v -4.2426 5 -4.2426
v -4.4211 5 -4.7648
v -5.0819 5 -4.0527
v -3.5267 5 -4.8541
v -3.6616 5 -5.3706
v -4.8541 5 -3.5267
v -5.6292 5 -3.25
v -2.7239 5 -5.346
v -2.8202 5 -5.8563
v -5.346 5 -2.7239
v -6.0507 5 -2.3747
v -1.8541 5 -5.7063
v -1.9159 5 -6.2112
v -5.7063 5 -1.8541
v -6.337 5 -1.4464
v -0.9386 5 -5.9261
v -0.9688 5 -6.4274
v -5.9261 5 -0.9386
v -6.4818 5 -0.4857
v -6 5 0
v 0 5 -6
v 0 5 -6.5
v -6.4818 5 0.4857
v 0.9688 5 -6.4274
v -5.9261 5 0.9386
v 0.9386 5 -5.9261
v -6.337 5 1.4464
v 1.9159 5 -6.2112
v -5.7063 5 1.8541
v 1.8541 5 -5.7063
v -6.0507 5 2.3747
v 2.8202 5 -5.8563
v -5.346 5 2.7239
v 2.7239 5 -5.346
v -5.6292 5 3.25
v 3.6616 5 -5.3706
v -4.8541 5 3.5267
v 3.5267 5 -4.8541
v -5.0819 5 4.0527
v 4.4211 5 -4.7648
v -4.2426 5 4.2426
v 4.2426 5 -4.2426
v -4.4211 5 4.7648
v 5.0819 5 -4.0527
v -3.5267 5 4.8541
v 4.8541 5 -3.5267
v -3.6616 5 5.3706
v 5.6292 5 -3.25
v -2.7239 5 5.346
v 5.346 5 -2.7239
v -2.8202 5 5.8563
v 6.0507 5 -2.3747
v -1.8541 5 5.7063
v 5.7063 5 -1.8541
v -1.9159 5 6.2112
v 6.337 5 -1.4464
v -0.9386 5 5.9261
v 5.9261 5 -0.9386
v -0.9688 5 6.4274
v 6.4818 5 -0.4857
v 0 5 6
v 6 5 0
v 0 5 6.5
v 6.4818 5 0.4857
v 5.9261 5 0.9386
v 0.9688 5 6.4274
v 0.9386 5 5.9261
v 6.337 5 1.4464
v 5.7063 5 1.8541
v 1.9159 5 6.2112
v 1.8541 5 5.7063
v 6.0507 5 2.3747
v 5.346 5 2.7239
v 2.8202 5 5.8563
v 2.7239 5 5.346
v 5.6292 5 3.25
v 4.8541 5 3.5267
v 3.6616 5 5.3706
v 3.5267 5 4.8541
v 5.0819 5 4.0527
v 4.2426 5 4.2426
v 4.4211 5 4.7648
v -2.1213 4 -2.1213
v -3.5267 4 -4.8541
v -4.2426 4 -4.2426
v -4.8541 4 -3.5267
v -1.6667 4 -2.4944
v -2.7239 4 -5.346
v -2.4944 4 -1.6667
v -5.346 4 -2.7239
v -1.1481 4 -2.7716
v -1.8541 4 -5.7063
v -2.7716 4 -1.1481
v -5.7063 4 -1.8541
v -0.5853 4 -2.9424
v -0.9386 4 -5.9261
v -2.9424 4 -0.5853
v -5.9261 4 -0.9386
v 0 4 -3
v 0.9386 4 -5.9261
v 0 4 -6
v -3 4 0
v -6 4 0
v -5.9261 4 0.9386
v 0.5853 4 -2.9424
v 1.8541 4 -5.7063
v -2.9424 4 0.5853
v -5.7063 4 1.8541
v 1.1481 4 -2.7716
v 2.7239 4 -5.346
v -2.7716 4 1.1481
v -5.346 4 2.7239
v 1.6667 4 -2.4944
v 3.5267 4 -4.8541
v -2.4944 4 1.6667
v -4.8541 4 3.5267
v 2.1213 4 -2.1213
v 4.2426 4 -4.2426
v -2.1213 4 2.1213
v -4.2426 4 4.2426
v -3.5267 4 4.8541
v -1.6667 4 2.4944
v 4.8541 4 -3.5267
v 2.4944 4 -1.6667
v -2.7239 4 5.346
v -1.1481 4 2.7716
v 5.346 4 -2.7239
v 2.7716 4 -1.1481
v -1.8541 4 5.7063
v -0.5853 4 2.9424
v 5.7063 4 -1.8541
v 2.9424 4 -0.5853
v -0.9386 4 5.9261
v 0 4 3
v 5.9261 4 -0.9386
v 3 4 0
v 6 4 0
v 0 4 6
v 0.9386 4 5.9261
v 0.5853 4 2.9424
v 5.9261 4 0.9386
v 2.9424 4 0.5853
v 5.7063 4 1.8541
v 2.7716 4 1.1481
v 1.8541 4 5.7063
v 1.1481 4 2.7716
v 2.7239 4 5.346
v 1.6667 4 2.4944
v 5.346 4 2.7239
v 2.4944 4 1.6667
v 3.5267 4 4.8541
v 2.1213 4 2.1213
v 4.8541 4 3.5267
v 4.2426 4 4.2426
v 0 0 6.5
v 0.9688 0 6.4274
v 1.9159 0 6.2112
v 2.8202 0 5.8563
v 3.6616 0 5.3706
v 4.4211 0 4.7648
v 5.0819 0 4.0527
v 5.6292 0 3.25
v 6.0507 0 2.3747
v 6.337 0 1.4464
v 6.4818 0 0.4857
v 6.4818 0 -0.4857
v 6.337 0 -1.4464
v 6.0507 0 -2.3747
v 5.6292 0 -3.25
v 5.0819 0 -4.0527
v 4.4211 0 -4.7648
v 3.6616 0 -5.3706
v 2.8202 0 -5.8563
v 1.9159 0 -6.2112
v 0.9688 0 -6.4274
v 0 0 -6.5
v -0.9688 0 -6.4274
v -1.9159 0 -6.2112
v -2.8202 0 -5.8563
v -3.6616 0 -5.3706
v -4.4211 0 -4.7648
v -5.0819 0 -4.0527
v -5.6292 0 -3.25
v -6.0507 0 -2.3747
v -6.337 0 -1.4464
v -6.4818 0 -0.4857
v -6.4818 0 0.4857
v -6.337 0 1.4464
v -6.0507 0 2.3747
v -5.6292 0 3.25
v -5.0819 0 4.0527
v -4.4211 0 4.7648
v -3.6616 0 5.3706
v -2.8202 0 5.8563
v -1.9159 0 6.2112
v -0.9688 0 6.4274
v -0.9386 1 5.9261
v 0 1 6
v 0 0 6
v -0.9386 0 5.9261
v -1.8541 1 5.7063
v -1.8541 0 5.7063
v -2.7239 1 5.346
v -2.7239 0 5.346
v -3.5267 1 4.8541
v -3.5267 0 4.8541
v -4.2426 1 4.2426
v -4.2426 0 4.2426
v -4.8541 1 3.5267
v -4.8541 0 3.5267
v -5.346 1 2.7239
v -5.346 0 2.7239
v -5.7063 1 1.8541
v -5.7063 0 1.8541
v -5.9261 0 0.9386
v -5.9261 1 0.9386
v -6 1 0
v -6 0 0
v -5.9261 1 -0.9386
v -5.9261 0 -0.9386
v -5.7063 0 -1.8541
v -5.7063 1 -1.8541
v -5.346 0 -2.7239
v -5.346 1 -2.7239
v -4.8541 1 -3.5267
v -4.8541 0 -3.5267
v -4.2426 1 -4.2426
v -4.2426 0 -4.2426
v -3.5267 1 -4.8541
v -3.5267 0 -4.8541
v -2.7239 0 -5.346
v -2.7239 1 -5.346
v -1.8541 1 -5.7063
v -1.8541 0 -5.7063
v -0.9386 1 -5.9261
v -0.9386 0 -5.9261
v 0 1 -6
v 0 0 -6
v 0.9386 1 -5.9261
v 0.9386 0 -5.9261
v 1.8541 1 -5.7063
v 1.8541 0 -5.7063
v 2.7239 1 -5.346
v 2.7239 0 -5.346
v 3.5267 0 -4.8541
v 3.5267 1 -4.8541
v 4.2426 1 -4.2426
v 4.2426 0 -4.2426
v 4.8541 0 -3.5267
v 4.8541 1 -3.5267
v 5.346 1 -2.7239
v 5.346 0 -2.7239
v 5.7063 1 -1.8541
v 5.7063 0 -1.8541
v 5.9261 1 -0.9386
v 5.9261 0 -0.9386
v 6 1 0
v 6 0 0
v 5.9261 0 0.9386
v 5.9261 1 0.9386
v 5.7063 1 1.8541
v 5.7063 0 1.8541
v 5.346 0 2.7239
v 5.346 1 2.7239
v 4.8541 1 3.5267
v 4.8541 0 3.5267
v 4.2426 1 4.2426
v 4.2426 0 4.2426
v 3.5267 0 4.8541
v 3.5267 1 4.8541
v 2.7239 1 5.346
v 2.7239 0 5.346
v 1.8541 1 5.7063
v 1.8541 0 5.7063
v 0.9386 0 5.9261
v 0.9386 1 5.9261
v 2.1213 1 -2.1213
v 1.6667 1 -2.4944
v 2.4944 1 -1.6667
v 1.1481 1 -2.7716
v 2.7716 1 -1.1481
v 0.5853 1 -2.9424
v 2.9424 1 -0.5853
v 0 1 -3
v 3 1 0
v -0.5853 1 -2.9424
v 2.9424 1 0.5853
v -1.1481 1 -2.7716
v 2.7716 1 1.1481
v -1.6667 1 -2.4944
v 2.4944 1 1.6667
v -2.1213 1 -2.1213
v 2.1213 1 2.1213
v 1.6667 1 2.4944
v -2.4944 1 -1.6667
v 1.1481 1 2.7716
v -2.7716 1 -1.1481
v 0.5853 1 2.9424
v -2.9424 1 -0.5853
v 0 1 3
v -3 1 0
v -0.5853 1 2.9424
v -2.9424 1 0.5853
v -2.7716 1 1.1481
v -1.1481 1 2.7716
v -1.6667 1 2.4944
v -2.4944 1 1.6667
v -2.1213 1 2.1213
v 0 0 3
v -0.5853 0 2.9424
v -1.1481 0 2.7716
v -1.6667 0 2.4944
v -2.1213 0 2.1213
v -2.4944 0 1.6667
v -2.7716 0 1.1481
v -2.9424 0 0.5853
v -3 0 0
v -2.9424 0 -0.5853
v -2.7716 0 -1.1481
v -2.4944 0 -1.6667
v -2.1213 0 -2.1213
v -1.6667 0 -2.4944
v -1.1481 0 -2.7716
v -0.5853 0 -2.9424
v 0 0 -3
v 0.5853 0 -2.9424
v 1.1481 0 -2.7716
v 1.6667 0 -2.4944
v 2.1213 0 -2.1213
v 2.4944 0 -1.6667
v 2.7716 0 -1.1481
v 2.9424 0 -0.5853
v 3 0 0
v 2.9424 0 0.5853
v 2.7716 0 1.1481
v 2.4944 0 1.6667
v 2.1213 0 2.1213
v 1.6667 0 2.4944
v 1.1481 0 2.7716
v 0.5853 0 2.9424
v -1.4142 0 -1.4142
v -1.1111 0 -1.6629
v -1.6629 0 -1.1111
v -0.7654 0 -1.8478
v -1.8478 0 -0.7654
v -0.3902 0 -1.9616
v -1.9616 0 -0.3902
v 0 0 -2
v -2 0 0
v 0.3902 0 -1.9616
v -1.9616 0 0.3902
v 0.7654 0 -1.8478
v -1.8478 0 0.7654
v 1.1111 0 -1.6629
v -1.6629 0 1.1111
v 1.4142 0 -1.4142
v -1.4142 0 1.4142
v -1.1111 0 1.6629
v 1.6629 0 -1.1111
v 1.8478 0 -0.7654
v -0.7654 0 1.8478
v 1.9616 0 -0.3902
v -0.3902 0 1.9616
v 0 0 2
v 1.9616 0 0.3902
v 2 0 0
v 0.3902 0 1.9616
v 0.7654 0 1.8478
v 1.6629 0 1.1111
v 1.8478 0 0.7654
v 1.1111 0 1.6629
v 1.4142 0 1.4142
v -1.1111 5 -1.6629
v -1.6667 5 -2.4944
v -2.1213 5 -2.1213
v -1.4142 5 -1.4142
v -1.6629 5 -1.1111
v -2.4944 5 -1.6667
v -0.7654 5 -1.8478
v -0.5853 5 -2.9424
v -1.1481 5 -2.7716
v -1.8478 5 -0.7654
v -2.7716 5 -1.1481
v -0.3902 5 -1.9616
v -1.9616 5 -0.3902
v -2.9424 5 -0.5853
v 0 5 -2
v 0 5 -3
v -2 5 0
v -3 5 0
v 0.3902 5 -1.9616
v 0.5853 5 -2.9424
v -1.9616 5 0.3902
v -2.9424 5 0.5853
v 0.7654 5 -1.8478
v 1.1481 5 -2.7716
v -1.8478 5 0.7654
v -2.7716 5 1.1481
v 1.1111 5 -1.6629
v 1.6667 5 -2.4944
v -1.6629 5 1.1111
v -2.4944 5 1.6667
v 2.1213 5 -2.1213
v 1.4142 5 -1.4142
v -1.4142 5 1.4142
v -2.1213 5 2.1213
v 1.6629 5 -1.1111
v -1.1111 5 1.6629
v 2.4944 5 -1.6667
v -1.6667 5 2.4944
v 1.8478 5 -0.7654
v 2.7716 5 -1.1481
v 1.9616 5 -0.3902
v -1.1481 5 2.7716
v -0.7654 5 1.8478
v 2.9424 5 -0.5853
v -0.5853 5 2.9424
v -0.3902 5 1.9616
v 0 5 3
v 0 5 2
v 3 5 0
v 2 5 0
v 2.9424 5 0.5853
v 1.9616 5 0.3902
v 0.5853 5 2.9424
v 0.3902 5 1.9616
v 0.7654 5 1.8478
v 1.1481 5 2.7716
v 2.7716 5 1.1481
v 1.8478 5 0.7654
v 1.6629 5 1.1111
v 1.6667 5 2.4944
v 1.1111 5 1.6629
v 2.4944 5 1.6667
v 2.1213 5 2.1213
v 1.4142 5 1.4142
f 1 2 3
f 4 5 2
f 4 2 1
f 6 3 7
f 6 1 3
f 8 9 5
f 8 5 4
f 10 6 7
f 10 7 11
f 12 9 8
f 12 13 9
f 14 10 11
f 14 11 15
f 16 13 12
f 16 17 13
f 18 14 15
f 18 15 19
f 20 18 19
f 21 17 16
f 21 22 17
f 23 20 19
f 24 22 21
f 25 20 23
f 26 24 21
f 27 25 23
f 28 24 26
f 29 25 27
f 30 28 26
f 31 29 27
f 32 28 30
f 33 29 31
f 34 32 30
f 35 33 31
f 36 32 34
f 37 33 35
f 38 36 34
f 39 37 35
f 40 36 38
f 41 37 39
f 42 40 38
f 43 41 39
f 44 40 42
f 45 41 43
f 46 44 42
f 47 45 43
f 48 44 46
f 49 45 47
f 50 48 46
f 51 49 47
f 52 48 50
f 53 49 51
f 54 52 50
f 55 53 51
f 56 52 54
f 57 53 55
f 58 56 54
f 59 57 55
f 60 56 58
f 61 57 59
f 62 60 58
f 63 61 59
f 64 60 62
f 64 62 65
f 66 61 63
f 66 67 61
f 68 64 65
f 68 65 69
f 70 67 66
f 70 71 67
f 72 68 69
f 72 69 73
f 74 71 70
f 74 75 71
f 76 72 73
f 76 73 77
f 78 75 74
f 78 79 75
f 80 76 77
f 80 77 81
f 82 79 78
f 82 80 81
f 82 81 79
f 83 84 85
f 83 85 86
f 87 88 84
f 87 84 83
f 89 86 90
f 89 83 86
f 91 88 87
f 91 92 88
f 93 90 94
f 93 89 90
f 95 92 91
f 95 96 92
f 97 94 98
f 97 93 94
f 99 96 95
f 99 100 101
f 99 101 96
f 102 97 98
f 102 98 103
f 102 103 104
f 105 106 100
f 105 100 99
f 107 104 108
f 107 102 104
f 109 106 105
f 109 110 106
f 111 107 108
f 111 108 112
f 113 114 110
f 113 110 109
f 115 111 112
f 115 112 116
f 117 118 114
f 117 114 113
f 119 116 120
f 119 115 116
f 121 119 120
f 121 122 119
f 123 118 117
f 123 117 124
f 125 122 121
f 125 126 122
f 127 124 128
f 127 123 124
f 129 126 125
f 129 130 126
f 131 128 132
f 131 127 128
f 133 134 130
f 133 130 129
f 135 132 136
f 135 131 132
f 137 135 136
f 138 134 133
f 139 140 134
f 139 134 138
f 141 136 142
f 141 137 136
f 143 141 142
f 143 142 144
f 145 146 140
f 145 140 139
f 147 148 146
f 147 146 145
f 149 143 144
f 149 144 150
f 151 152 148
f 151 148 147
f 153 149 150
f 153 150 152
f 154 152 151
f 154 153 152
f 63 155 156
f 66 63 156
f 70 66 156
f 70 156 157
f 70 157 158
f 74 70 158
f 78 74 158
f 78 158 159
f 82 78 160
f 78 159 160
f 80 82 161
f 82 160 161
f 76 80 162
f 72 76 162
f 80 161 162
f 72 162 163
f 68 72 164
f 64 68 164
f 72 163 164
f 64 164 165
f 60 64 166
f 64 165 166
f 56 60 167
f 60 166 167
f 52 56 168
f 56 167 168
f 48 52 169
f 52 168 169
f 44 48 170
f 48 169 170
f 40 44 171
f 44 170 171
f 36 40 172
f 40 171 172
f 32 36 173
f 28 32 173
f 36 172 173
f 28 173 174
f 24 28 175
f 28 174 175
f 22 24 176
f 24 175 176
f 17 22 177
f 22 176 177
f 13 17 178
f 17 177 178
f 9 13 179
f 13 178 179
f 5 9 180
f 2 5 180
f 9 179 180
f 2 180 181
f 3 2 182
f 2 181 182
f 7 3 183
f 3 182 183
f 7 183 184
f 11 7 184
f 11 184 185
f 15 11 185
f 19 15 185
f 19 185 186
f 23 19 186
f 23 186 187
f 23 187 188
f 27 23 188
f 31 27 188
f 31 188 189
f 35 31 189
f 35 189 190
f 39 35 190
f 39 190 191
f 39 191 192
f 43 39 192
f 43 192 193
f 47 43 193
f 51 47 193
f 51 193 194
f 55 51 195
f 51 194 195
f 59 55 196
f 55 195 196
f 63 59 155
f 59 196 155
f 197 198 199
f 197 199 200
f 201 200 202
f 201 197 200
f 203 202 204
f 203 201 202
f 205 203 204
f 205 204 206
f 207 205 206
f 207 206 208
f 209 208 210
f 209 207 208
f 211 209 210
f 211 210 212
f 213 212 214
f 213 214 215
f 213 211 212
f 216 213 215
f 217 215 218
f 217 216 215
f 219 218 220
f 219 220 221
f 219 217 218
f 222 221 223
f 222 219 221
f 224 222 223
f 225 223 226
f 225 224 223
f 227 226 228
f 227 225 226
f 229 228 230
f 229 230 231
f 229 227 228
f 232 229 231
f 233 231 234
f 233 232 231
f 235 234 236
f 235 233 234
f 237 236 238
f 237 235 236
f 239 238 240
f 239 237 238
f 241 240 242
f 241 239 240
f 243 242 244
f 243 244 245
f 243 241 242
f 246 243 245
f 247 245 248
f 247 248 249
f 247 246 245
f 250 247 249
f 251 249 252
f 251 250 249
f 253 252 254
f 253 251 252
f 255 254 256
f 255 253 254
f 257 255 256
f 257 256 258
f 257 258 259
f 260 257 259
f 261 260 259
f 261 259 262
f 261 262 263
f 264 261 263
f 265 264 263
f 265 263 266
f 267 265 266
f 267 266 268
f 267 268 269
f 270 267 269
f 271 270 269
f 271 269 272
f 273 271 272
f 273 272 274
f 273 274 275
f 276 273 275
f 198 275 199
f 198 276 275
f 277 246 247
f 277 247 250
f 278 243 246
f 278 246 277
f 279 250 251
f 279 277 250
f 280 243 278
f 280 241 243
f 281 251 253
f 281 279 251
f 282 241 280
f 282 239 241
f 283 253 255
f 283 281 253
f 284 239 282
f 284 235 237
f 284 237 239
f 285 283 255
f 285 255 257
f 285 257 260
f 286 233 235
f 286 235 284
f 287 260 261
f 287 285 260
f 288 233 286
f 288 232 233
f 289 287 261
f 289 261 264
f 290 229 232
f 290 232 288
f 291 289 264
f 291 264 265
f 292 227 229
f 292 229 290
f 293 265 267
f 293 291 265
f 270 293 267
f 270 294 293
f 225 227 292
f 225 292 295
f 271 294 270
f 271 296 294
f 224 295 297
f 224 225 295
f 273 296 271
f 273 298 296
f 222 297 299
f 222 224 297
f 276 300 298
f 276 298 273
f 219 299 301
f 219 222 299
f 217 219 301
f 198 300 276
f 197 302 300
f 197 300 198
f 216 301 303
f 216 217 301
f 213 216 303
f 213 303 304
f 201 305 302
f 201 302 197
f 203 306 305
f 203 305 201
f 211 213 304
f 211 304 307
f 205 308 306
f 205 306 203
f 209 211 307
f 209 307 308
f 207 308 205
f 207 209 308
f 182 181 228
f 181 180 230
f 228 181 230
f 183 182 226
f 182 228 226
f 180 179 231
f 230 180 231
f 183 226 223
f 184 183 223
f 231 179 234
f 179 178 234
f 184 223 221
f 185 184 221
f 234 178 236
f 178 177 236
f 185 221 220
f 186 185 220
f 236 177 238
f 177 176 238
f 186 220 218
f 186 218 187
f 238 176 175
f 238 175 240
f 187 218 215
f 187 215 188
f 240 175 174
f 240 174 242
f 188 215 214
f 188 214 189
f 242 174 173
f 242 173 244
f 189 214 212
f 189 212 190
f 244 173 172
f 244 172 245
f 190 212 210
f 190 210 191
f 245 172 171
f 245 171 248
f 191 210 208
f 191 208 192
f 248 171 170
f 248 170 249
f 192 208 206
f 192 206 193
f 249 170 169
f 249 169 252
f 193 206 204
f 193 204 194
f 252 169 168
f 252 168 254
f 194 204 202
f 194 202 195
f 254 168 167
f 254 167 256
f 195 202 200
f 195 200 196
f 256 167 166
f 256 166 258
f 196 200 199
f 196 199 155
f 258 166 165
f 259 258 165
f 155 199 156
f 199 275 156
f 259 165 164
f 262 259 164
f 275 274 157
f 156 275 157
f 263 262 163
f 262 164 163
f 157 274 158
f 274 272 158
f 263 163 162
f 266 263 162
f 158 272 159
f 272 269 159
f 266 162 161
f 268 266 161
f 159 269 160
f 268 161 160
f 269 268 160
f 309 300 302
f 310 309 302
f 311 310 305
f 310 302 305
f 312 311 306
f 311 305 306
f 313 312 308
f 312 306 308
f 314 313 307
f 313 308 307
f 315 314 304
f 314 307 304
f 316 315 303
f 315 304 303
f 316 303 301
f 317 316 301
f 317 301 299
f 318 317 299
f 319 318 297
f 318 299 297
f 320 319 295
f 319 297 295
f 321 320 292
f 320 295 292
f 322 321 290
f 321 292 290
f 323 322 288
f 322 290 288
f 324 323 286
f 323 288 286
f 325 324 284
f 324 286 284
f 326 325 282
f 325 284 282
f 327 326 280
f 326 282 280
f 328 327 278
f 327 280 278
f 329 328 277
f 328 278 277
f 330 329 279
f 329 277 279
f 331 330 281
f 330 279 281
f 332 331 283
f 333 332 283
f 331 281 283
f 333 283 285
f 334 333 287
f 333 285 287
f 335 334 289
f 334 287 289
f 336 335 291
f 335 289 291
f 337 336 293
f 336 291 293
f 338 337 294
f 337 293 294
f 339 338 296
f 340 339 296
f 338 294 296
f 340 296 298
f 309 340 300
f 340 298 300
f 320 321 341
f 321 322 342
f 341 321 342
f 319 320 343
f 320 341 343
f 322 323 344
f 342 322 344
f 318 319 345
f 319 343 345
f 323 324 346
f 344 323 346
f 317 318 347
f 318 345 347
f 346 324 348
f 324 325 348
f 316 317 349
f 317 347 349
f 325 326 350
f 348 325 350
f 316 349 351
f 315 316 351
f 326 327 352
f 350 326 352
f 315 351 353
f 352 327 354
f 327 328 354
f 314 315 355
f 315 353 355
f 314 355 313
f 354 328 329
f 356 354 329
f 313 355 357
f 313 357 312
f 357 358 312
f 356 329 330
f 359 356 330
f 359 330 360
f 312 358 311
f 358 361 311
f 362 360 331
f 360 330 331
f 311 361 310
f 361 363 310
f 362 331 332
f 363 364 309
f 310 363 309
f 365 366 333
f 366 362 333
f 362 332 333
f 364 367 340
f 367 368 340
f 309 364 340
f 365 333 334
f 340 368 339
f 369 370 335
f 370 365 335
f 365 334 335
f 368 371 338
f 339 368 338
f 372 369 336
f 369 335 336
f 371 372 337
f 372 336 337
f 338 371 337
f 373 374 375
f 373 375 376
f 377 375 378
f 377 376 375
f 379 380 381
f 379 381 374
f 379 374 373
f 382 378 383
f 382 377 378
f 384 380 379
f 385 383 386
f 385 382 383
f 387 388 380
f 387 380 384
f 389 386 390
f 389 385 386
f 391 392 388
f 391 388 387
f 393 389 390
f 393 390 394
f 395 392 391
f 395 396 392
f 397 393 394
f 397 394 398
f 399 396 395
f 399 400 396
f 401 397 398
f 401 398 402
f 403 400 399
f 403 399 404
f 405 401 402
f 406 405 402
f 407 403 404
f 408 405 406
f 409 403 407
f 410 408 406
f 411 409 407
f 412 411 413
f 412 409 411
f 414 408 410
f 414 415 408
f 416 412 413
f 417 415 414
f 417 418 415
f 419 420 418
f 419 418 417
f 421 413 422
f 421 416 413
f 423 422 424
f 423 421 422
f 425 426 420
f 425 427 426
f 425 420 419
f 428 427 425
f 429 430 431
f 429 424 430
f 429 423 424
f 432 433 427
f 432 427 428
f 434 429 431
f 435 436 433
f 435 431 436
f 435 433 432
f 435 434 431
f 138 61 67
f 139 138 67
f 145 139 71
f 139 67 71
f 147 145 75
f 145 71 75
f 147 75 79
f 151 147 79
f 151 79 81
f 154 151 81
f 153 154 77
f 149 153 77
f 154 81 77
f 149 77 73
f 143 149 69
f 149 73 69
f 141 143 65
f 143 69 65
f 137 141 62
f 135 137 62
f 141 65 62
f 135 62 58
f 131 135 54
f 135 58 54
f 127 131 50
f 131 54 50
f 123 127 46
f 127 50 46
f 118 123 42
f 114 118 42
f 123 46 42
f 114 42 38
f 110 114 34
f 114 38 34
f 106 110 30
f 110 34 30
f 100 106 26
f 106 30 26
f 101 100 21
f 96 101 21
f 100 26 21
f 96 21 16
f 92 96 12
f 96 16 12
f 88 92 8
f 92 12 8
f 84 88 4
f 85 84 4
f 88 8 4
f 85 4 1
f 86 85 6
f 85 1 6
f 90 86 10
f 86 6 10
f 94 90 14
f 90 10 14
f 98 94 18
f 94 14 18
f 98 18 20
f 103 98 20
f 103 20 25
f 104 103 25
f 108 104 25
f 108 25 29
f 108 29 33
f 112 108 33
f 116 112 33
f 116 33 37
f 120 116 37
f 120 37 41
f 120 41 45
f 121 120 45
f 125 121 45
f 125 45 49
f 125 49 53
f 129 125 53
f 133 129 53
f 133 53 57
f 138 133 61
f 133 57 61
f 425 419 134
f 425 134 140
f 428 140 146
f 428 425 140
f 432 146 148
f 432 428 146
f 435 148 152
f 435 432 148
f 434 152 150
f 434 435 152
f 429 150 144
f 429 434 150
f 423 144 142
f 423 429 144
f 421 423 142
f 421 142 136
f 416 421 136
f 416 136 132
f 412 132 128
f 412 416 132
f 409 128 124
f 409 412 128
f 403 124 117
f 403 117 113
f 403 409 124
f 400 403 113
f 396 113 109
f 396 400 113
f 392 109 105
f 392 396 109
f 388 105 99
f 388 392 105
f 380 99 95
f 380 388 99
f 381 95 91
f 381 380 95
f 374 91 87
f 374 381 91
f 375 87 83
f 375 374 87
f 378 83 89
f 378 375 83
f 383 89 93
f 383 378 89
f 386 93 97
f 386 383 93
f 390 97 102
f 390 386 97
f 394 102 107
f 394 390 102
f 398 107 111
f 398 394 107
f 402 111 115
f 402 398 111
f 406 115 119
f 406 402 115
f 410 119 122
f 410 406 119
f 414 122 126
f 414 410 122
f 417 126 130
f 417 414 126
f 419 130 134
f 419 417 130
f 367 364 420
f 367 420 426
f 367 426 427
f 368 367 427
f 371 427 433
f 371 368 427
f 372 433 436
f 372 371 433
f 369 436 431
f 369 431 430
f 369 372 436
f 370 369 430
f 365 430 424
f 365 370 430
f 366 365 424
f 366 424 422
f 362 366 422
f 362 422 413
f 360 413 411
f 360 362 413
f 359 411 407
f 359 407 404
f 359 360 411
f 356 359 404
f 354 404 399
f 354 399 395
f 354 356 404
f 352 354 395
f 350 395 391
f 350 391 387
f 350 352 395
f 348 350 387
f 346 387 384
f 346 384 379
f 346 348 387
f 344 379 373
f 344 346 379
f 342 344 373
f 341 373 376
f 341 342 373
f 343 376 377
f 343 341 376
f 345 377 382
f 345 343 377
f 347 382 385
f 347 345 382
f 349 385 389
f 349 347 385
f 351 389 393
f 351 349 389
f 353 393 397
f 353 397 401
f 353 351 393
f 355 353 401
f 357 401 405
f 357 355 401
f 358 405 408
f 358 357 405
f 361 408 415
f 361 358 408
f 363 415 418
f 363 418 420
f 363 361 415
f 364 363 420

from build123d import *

# Parameters (mm, degrees)
SKETCH_1_R          = 6.5
SKETCH_1_R_2        = 2
EXTRUDE_1_DEPTH     = 5
SKETCH_2_R          = 6
SKETCH_2_R_2        = 3
CUT_EXTRUDE_1_DEPTH = 1
CUT_EXTRUDE_START   = -1
SKETCH_3_R          = 6
SKETCH_3_R_2        = 3
CUT_EXTRUDE_2_DEPTH = 1


with BuildPart() as part:
    # Эскиз1 → Бобышка-Вытянуть1 (new body)
    with BuildSketch(Plane(origin=(0, 0, 0), x_dir=(1, 0, 0), z_dir=(0, 1, 0))):
        with Locations(Location((0, 0, 0), (0, 0, 270))):
            Circle(SKETCH_1_R)
        with Locations(Location((0, 0, 0), (0, 0, 270))):
            Circle(SKETCH_1_R_2, mode=Mode.SUBTRACT)
    extrude(amount=EXTRUDE_1_DEPTH)

    # Эскиз2 → Вырез-Вытянуть1 (cut)
    with BuildSketch(Plane(origin=(0, 5, 0), x_dir=(1, 0, 0), z_dir=(0, 1, 0))):
        with Locations(Location((0, 0, 0), (0, 0, 270))):
            Circle(SKETCH_2_R)
        with Locations(Location((0, 0, 0), (0, 0, 270))):
            Circle(SKETCH_2_R_2, mode=Mode.SUBTRACT)
    extrude(amount=-CUT_EXTRUDE_1_DEPTH, mode=Mode.SUBTRACT)

    # Эскиз3 → Вырез-Вытянуть2 (cut)
    with BuildSketch(Plane.XZ.offset(CUT_EXTRUDE_START)):
        with Locations(Location((0, 0, 0), (0, 0, 90))):
            Circle(SKETCH_3_R)
        with Locations(Location((0, 0, 0), (0, 0, 90))):
            Circle(SKETCH_3_R_2, mode=Mode.SUBTRACT)
    extrude(amount=CUT_EXTRUDE_2_DEPTH, mode=Mode.SUBTRACT)


solid = part.part
